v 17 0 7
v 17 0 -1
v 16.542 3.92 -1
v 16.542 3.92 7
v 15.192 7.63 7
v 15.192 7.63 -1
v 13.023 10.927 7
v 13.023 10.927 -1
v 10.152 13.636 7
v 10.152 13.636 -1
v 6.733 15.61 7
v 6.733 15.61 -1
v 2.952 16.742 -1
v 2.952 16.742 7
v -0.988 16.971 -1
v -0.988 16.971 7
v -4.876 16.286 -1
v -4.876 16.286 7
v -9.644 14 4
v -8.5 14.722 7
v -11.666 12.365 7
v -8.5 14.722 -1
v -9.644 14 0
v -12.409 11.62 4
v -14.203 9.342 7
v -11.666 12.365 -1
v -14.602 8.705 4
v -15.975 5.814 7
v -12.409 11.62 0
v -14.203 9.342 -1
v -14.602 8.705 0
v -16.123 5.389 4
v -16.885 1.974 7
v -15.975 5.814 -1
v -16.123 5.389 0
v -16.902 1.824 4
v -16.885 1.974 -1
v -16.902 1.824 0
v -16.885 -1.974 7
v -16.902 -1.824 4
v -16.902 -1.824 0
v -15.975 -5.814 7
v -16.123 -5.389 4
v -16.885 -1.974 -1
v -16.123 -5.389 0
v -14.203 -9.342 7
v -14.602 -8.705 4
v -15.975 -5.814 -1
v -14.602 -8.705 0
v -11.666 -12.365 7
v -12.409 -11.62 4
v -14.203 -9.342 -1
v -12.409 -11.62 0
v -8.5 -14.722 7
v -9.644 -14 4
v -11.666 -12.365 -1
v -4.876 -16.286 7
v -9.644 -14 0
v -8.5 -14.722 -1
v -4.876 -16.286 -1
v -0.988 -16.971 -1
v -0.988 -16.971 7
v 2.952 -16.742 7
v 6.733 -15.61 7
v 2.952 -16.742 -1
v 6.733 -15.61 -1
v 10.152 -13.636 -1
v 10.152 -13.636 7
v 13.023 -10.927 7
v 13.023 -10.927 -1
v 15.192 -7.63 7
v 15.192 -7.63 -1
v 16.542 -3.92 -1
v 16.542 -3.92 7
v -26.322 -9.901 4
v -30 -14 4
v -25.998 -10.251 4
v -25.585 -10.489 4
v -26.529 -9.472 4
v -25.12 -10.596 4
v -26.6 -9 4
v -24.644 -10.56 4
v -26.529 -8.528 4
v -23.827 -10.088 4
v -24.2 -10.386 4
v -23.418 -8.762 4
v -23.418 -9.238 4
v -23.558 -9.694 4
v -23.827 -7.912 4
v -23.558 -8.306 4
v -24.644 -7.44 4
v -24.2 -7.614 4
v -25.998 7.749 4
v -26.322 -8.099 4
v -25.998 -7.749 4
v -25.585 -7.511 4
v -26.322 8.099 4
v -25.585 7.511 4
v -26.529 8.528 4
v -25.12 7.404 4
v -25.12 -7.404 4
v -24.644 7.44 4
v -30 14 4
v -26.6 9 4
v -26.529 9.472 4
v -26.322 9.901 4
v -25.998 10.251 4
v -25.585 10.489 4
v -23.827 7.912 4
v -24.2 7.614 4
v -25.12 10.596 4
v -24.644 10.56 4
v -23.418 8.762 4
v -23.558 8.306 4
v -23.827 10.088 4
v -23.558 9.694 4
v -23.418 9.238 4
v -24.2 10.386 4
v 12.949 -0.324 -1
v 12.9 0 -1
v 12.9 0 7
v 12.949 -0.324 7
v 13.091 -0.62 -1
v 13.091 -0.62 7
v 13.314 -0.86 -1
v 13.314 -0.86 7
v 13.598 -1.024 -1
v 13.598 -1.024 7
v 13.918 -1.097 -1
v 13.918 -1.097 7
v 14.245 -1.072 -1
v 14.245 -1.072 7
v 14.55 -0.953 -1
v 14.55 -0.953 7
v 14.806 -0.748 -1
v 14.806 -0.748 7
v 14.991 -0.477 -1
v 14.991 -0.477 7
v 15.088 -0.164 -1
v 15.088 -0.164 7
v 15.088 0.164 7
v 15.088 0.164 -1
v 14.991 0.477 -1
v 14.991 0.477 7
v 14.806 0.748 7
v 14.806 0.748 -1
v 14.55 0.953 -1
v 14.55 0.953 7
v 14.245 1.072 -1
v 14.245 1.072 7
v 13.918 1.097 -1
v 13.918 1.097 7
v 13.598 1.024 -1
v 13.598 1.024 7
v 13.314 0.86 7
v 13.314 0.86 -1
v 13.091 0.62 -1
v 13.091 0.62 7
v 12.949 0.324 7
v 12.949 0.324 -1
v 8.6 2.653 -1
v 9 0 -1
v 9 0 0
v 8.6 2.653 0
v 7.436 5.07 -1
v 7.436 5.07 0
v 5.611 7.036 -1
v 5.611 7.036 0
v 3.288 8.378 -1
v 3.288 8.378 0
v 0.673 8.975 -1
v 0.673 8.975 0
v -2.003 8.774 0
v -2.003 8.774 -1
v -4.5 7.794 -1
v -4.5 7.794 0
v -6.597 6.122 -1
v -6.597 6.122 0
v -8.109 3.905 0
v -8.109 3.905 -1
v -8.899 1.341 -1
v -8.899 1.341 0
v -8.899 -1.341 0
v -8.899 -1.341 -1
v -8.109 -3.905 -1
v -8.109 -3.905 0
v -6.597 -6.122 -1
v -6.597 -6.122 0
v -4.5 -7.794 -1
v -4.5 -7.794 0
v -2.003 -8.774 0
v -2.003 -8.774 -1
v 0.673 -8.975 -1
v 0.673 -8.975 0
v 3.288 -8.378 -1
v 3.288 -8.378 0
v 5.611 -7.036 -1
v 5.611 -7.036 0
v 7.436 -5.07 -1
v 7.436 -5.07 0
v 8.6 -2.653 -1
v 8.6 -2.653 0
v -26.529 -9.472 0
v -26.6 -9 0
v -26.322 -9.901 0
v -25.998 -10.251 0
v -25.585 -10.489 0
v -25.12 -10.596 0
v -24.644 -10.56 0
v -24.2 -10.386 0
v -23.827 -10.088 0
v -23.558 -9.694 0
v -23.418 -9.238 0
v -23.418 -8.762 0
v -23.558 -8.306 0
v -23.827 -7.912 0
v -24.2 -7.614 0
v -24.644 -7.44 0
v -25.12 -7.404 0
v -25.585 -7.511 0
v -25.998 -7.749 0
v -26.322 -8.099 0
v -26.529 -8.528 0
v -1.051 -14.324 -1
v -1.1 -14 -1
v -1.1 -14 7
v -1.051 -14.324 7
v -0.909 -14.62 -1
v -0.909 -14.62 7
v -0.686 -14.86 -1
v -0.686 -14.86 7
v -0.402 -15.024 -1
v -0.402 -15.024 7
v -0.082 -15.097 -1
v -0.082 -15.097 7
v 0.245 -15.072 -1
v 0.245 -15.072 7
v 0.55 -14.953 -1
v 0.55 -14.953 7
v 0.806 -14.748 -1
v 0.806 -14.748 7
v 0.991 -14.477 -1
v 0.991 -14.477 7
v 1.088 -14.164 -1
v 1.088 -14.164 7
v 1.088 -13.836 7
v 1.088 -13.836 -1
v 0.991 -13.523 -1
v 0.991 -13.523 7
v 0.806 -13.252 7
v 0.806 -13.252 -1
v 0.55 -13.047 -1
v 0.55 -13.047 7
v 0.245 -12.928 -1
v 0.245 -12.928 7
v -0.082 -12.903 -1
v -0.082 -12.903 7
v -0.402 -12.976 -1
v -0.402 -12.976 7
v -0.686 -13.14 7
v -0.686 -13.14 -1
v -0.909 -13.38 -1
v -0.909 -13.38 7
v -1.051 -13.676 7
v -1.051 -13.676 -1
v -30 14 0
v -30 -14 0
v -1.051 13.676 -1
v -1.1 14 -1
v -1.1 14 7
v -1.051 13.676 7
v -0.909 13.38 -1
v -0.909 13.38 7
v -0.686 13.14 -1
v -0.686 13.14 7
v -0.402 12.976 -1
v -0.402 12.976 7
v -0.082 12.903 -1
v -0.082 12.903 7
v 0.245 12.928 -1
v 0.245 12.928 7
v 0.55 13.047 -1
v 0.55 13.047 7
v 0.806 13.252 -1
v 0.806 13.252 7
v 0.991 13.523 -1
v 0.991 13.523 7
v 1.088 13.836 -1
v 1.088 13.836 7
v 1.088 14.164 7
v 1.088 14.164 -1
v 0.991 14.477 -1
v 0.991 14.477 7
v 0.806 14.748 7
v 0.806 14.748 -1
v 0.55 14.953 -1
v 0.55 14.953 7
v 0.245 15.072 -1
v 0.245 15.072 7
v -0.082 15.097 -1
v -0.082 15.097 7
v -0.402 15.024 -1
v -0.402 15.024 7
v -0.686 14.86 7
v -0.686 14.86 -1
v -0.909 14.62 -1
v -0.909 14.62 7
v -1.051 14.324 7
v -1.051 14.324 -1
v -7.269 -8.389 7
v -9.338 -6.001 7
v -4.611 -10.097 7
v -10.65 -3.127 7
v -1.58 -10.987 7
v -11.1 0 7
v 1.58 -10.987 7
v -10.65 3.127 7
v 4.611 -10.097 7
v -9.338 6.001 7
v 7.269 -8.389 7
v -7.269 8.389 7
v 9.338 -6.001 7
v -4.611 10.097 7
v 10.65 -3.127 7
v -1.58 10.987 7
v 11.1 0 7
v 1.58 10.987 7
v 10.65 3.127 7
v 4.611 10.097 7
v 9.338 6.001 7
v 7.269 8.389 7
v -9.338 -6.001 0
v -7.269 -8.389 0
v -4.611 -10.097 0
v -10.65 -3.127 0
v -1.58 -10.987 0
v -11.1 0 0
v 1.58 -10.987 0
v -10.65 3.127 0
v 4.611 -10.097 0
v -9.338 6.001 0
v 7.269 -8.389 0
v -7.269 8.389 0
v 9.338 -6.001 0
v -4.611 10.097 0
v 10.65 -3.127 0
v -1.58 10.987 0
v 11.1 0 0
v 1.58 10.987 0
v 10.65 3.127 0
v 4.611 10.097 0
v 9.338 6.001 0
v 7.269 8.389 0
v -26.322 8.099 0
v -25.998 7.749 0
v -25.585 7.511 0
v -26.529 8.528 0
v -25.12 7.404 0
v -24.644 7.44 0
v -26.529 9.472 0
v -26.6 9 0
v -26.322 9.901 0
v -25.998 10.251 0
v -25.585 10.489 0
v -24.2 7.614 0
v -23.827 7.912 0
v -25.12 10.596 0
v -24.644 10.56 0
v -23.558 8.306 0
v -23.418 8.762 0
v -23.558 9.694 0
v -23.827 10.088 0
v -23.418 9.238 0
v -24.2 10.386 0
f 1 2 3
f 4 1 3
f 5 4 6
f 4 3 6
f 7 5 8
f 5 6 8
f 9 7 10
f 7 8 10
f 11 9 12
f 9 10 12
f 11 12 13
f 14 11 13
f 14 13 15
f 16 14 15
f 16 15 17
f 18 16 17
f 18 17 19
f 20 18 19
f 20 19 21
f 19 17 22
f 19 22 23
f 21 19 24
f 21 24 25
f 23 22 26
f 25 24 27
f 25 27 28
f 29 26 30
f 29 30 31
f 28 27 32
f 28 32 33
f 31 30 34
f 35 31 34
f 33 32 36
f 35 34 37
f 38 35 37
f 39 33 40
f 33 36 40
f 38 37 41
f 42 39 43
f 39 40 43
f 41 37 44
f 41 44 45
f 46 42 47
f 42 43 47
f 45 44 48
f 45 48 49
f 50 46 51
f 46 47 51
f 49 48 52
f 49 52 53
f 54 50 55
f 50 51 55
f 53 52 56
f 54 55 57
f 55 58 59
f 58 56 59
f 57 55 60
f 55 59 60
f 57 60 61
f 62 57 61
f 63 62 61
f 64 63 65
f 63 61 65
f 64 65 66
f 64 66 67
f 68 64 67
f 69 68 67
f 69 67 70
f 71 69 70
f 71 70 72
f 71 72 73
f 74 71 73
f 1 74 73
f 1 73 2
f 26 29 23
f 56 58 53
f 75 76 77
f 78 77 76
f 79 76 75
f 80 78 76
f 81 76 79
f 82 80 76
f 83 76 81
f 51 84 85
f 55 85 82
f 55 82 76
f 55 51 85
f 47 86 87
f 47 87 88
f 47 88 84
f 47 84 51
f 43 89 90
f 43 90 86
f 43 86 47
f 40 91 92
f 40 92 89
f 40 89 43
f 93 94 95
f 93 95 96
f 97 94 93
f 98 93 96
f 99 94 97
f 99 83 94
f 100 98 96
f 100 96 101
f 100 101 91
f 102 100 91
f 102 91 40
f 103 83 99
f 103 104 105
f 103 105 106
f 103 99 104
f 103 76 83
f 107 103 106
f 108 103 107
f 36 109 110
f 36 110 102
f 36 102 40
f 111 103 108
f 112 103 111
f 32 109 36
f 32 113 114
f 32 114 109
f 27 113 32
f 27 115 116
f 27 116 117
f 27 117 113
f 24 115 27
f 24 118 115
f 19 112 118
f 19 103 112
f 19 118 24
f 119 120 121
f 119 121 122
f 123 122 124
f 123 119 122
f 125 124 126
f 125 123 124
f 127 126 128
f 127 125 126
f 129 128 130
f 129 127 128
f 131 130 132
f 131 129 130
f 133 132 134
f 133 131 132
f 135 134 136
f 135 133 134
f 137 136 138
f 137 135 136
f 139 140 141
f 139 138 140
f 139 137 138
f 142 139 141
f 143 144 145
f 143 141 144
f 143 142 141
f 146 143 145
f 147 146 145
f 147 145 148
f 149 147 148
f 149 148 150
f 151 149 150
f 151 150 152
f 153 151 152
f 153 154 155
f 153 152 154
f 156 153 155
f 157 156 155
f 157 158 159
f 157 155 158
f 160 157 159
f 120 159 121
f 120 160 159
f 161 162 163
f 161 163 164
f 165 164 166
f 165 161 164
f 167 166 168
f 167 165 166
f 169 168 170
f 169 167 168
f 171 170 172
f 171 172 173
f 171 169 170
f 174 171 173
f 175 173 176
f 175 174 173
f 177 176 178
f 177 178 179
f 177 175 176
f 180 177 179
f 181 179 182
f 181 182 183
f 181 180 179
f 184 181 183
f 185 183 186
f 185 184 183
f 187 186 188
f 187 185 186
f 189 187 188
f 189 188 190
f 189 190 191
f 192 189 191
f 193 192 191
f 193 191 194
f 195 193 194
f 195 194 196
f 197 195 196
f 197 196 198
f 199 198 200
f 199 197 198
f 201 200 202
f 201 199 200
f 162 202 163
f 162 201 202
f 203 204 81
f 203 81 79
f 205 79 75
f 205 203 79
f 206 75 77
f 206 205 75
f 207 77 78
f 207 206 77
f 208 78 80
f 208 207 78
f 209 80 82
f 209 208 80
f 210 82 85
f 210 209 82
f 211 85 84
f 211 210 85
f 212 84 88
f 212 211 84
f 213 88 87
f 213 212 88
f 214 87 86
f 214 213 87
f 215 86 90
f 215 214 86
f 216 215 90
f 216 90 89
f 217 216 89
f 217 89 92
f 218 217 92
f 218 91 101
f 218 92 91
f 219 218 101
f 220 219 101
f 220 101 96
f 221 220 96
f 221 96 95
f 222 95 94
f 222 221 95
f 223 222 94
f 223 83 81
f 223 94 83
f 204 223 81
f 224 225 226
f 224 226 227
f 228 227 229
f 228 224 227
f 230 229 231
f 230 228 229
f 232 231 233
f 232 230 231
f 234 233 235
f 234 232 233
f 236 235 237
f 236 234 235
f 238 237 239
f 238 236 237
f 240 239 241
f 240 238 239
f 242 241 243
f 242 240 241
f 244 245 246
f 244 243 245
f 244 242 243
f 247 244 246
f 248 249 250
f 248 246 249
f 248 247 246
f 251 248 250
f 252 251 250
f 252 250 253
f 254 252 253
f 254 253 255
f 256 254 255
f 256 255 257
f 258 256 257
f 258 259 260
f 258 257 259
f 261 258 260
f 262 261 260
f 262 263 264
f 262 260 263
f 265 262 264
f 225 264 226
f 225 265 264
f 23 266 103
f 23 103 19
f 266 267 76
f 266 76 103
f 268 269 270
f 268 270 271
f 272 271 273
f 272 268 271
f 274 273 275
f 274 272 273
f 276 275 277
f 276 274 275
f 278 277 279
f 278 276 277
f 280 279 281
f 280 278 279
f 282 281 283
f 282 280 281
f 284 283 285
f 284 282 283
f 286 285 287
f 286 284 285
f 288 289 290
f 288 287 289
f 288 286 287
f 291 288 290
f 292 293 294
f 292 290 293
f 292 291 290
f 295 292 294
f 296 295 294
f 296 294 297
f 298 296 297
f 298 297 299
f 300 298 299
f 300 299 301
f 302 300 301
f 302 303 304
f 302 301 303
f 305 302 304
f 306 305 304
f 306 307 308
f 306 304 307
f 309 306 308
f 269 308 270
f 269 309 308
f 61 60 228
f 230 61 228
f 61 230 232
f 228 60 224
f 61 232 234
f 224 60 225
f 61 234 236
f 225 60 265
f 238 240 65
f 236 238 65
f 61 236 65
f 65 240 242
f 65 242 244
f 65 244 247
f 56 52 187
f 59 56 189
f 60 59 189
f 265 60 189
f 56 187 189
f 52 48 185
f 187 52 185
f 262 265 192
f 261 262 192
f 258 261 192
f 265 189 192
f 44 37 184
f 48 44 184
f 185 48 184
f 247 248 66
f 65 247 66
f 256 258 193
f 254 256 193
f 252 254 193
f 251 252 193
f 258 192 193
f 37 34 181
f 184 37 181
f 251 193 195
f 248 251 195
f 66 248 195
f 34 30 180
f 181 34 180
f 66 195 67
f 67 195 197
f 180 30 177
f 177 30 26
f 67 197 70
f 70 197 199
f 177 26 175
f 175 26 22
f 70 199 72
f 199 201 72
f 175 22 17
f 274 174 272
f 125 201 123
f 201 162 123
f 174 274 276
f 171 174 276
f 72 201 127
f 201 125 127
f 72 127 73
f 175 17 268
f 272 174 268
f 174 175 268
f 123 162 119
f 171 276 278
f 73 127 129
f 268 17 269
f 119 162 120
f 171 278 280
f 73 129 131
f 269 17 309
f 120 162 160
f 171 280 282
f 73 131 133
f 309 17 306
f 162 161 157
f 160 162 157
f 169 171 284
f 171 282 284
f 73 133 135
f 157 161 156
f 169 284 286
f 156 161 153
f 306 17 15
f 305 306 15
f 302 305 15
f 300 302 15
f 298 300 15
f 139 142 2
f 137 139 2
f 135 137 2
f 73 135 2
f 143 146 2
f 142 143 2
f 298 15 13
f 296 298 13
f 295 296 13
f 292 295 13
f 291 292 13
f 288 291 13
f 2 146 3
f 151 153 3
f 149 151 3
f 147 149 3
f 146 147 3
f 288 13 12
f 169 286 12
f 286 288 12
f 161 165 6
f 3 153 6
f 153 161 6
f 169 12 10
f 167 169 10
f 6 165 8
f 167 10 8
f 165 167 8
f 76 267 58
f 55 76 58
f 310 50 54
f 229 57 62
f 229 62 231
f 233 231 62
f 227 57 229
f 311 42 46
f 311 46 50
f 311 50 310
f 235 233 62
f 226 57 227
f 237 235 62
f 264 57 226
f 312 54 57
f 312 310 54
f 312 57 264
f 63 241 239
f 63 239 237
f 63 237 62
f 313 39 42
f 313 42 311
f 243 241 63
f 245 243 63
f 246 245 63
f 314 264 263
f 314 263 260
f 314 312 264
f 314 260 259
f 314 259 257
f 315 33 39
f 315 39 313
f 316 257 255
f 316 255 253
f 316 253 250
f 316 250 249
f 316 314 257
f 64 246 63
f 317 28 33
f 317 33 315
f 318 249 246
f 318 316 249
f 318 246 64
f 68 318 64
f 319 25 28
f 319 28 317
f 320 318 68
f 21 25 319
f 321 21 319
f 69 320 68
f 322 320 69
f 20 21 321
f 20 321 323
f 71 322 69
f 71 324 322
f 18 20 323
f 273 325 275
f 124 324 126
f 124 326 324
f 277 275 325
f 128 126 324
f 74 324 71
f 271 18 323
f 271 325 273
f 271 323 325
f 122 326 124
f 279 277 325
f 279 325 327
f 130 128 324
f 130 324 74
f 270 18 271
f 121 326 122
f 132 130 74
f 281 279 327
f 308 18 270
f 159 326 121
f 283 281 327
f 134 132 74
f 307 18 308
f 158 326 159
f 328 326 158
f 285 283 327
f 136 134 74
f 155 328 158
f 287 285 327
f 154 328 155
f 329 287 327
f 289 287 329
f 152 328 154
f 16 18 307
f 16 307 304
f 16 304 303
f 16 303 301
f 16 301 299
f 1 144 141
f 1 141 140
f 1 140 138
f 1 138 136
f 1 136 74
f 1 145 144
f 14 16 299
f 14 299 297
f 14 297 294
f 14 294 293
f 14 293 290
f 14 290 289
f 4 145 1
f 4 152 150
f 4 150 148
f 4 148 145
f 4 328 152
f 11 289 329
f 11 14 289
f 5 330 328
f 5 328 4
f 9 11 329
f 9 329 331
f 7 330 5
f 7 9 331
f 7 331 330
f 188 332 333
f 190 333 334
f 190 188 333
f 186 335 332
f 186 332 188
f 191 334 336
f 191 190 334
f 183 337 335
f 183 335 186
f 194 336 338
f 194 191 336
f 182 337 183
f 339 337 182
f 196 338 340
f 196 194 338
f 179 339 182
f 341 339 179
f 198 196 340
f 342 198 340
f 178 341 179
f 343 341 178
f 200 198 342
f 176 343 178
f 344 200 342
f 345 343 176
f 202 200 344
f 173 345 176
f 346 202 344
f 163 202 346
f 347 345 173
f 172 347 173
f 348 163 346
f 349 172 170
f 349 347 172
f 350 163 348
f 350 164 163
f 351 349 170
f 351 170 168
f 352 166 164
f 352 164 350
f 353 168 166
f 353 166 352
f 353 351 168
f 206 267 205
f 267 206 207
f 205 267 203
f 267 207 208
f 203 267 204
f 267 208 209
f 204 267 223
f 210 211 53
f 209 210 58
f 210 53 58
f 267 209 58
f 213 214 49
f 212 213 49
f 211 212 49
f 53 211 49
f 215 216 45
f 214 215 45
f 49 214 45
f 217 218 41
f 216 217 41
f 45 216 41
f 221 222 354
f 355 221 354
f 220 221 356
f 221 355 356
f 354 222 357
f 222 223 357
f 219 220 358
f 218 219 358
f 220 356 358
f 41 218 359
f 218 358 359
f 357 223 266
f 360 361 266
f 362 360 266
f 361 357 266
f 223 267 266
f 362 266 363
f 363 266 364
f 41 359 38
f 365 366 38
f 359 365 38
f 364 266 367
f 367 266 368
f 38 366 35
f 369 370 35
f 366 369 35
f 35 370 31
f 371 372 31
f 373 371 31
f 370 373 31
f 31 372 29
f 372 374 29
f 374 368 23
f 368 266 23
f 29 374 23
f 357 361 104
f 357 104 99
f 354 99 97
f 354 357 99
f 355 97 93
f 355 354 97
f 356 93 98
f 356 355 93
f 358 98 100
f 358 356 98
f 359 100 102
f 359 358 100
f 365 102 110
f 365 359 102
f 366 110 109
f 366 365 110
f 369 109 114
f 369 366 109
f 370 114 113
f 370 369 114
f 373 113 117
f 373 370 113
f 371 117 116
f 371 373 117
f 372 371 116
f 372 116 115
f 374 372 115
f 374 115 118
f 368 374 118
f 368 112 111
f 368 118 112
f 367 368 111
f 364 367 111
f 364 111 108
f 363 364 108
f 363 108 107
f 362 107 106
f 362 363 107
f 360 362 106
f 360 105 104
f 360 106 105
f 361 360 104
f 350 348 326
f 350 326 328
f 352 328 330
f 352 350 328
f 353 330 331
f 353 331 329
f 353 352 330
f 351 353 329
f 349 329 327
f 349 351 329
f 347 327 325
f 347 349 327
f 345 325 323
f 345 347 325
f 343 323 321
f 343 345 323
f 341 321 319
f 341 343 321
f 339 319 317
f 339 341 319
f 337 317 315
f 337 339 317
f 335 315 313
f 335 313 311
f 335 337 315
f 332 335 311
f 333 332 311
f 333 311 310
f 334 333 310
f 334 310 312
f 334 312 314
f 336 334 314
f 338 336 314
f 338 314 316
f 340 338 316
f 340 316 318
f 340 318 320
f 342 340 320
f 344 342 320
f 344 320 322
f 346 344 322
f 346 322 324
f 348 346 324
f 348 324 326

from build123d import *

# Parameters (mm, degrees)
BEARING_HOUSING_PROFILE_R                  = 17
BEARING_HOUSING_PROFILE_R_2                = 11.1
BEARING_HOUSING_DEPTH                      = 7
MOUNTING_WEB_PROFILE_W                     = 30
MOUNTING_WEB_PROFILE_H                     = 28
MOUNTING_WEB_DEPTH                         = 4
BEARING_SEAT_START                         = -50
BEARING_SEAT_PROFILE_R                     = 11.1
BEARING_SEAT_DEPTH                         = 86.185224172
INNER_OUTER_RACE_RETAINING_LIP_START       = -1
INNER_OUTER_RACE_RETAINING_LIP_PROFILE_R   = 17
INNER_OUTER_RACE_RETAINING_LIP_PROFILE_R_2 = 9
INNER_OUTER_RACE_RETAINING_LIP_DEPTH       = 1
STANDOFF_FASTENERS_START                   = -50
STANDOFF_FASTENERS_PROFILE_R               = 1.6
STANDOFF_FASTENERS_DEPTH                   = 86.185224172
BEARING_KEEPER_FASTENERS_START             = -50
BEARING_KEEPER_FASTENERS_PROFILE_R         = 1.1
BEARING_KEEPER_FASTENERS_DEPTH             = 86.185224172


with BuildPart() as part:
    # Bearing_housing_profile → Bearing_housing (new body)
    with BuildSketch(Plane.XY):
        Circle(BEARING_HOUSING_PROFILE_R)
        Circle(BEARING_HOUSING_PROFILE_R_2, mode=Mode.SUBTRACT)
    extrude(amount=BEARING_HOUSING_DEPTH)

    # Mounting_web_profile → Mounting_web (add)
    with BuildSketch(Plane.XY):
        with Locations((-15, 0)):
            Rectangle(MOUNTING_WEB_PROFILE_W, MOUNTING_WEB_PROFILE_H)
    extrude(amount=MOUNTING_WEB_DEPTH)

    # Bearing_seat_profile → Bearing_seat (cut, through all)
    with BuildSketch(Plane.XY.offset(BEARING_SEAT_START)):
        Circle(BEARING_SEAT_PROFILE_R)
    extrude(amount=BEARING_SEAT_DEPTH, mode=Mode.SUBTRACT)

    # Inner_outer_race_retaining_lip_profile → Inner_outer_race_retaining_lip (add)
    with BuildSketch(Plane.XY.offset(INNER_OUTER_RACE_RETAINING_LIP_START)):
        Circle(INNER_OUTER_RACE_RETAINING_LIP_PROFILE_R)
        Circle(INNER_OUTER_RACE_RETAINING_LIP_PROFILE_R_2, mode=Mode.SUBTRACT)
    extrude(amount=INNER_OUTER_RACE_RETAINING_LIP_DEPTH)

    # Standoff_fasteners_profile → Standoff_fasteners (cut, through all)
    with BuildSketch(Plane.XY.offset(STANDOFF_FASTENERS_START)):
        with Locations(Location((-25, -9, 0), (0, 0, 180))):
            Circle(STANDOFF_FASTENERS_PROFILE_R)
        with Locations(Location((-25, 9, 0), (0, 0, 180))):
            Circle(STANDOFF_FASTENERS_PROFILE_R)
    extrude(amount=STANDOFF_FASTENERS_DEPTH, mode=Mode.SUBTRACT)

    # Bearing_keeper_fasteners_profile → Bearing_keeper_fasteners (cut, through all)
    with BuildSketch(Plane.XY.offset(BEARING_KEEPER_FASTENERS_START)):
        with Locations(Location((14, 0, 0), (0, 0, 180))):
            Circle(BEARING_KEEPER_FASTENERS_PROFILE_R)
        with Locations(Location((0, -14, 0), (0, 0, 180))):
            Circle(BEARING_KEEPER_FASTENERS_PROFILE_R)
        with Locations(Location((0, 14, 0), (0, 0, 180))):
            Circle(BEARING_KEEPER_FASTENERS_PROFILE_R)
    extrude(amount=BEARING_KEEPER_FASTENERS_DEPTH, mode=Mode.SUBTRACT)


solid = part.part
